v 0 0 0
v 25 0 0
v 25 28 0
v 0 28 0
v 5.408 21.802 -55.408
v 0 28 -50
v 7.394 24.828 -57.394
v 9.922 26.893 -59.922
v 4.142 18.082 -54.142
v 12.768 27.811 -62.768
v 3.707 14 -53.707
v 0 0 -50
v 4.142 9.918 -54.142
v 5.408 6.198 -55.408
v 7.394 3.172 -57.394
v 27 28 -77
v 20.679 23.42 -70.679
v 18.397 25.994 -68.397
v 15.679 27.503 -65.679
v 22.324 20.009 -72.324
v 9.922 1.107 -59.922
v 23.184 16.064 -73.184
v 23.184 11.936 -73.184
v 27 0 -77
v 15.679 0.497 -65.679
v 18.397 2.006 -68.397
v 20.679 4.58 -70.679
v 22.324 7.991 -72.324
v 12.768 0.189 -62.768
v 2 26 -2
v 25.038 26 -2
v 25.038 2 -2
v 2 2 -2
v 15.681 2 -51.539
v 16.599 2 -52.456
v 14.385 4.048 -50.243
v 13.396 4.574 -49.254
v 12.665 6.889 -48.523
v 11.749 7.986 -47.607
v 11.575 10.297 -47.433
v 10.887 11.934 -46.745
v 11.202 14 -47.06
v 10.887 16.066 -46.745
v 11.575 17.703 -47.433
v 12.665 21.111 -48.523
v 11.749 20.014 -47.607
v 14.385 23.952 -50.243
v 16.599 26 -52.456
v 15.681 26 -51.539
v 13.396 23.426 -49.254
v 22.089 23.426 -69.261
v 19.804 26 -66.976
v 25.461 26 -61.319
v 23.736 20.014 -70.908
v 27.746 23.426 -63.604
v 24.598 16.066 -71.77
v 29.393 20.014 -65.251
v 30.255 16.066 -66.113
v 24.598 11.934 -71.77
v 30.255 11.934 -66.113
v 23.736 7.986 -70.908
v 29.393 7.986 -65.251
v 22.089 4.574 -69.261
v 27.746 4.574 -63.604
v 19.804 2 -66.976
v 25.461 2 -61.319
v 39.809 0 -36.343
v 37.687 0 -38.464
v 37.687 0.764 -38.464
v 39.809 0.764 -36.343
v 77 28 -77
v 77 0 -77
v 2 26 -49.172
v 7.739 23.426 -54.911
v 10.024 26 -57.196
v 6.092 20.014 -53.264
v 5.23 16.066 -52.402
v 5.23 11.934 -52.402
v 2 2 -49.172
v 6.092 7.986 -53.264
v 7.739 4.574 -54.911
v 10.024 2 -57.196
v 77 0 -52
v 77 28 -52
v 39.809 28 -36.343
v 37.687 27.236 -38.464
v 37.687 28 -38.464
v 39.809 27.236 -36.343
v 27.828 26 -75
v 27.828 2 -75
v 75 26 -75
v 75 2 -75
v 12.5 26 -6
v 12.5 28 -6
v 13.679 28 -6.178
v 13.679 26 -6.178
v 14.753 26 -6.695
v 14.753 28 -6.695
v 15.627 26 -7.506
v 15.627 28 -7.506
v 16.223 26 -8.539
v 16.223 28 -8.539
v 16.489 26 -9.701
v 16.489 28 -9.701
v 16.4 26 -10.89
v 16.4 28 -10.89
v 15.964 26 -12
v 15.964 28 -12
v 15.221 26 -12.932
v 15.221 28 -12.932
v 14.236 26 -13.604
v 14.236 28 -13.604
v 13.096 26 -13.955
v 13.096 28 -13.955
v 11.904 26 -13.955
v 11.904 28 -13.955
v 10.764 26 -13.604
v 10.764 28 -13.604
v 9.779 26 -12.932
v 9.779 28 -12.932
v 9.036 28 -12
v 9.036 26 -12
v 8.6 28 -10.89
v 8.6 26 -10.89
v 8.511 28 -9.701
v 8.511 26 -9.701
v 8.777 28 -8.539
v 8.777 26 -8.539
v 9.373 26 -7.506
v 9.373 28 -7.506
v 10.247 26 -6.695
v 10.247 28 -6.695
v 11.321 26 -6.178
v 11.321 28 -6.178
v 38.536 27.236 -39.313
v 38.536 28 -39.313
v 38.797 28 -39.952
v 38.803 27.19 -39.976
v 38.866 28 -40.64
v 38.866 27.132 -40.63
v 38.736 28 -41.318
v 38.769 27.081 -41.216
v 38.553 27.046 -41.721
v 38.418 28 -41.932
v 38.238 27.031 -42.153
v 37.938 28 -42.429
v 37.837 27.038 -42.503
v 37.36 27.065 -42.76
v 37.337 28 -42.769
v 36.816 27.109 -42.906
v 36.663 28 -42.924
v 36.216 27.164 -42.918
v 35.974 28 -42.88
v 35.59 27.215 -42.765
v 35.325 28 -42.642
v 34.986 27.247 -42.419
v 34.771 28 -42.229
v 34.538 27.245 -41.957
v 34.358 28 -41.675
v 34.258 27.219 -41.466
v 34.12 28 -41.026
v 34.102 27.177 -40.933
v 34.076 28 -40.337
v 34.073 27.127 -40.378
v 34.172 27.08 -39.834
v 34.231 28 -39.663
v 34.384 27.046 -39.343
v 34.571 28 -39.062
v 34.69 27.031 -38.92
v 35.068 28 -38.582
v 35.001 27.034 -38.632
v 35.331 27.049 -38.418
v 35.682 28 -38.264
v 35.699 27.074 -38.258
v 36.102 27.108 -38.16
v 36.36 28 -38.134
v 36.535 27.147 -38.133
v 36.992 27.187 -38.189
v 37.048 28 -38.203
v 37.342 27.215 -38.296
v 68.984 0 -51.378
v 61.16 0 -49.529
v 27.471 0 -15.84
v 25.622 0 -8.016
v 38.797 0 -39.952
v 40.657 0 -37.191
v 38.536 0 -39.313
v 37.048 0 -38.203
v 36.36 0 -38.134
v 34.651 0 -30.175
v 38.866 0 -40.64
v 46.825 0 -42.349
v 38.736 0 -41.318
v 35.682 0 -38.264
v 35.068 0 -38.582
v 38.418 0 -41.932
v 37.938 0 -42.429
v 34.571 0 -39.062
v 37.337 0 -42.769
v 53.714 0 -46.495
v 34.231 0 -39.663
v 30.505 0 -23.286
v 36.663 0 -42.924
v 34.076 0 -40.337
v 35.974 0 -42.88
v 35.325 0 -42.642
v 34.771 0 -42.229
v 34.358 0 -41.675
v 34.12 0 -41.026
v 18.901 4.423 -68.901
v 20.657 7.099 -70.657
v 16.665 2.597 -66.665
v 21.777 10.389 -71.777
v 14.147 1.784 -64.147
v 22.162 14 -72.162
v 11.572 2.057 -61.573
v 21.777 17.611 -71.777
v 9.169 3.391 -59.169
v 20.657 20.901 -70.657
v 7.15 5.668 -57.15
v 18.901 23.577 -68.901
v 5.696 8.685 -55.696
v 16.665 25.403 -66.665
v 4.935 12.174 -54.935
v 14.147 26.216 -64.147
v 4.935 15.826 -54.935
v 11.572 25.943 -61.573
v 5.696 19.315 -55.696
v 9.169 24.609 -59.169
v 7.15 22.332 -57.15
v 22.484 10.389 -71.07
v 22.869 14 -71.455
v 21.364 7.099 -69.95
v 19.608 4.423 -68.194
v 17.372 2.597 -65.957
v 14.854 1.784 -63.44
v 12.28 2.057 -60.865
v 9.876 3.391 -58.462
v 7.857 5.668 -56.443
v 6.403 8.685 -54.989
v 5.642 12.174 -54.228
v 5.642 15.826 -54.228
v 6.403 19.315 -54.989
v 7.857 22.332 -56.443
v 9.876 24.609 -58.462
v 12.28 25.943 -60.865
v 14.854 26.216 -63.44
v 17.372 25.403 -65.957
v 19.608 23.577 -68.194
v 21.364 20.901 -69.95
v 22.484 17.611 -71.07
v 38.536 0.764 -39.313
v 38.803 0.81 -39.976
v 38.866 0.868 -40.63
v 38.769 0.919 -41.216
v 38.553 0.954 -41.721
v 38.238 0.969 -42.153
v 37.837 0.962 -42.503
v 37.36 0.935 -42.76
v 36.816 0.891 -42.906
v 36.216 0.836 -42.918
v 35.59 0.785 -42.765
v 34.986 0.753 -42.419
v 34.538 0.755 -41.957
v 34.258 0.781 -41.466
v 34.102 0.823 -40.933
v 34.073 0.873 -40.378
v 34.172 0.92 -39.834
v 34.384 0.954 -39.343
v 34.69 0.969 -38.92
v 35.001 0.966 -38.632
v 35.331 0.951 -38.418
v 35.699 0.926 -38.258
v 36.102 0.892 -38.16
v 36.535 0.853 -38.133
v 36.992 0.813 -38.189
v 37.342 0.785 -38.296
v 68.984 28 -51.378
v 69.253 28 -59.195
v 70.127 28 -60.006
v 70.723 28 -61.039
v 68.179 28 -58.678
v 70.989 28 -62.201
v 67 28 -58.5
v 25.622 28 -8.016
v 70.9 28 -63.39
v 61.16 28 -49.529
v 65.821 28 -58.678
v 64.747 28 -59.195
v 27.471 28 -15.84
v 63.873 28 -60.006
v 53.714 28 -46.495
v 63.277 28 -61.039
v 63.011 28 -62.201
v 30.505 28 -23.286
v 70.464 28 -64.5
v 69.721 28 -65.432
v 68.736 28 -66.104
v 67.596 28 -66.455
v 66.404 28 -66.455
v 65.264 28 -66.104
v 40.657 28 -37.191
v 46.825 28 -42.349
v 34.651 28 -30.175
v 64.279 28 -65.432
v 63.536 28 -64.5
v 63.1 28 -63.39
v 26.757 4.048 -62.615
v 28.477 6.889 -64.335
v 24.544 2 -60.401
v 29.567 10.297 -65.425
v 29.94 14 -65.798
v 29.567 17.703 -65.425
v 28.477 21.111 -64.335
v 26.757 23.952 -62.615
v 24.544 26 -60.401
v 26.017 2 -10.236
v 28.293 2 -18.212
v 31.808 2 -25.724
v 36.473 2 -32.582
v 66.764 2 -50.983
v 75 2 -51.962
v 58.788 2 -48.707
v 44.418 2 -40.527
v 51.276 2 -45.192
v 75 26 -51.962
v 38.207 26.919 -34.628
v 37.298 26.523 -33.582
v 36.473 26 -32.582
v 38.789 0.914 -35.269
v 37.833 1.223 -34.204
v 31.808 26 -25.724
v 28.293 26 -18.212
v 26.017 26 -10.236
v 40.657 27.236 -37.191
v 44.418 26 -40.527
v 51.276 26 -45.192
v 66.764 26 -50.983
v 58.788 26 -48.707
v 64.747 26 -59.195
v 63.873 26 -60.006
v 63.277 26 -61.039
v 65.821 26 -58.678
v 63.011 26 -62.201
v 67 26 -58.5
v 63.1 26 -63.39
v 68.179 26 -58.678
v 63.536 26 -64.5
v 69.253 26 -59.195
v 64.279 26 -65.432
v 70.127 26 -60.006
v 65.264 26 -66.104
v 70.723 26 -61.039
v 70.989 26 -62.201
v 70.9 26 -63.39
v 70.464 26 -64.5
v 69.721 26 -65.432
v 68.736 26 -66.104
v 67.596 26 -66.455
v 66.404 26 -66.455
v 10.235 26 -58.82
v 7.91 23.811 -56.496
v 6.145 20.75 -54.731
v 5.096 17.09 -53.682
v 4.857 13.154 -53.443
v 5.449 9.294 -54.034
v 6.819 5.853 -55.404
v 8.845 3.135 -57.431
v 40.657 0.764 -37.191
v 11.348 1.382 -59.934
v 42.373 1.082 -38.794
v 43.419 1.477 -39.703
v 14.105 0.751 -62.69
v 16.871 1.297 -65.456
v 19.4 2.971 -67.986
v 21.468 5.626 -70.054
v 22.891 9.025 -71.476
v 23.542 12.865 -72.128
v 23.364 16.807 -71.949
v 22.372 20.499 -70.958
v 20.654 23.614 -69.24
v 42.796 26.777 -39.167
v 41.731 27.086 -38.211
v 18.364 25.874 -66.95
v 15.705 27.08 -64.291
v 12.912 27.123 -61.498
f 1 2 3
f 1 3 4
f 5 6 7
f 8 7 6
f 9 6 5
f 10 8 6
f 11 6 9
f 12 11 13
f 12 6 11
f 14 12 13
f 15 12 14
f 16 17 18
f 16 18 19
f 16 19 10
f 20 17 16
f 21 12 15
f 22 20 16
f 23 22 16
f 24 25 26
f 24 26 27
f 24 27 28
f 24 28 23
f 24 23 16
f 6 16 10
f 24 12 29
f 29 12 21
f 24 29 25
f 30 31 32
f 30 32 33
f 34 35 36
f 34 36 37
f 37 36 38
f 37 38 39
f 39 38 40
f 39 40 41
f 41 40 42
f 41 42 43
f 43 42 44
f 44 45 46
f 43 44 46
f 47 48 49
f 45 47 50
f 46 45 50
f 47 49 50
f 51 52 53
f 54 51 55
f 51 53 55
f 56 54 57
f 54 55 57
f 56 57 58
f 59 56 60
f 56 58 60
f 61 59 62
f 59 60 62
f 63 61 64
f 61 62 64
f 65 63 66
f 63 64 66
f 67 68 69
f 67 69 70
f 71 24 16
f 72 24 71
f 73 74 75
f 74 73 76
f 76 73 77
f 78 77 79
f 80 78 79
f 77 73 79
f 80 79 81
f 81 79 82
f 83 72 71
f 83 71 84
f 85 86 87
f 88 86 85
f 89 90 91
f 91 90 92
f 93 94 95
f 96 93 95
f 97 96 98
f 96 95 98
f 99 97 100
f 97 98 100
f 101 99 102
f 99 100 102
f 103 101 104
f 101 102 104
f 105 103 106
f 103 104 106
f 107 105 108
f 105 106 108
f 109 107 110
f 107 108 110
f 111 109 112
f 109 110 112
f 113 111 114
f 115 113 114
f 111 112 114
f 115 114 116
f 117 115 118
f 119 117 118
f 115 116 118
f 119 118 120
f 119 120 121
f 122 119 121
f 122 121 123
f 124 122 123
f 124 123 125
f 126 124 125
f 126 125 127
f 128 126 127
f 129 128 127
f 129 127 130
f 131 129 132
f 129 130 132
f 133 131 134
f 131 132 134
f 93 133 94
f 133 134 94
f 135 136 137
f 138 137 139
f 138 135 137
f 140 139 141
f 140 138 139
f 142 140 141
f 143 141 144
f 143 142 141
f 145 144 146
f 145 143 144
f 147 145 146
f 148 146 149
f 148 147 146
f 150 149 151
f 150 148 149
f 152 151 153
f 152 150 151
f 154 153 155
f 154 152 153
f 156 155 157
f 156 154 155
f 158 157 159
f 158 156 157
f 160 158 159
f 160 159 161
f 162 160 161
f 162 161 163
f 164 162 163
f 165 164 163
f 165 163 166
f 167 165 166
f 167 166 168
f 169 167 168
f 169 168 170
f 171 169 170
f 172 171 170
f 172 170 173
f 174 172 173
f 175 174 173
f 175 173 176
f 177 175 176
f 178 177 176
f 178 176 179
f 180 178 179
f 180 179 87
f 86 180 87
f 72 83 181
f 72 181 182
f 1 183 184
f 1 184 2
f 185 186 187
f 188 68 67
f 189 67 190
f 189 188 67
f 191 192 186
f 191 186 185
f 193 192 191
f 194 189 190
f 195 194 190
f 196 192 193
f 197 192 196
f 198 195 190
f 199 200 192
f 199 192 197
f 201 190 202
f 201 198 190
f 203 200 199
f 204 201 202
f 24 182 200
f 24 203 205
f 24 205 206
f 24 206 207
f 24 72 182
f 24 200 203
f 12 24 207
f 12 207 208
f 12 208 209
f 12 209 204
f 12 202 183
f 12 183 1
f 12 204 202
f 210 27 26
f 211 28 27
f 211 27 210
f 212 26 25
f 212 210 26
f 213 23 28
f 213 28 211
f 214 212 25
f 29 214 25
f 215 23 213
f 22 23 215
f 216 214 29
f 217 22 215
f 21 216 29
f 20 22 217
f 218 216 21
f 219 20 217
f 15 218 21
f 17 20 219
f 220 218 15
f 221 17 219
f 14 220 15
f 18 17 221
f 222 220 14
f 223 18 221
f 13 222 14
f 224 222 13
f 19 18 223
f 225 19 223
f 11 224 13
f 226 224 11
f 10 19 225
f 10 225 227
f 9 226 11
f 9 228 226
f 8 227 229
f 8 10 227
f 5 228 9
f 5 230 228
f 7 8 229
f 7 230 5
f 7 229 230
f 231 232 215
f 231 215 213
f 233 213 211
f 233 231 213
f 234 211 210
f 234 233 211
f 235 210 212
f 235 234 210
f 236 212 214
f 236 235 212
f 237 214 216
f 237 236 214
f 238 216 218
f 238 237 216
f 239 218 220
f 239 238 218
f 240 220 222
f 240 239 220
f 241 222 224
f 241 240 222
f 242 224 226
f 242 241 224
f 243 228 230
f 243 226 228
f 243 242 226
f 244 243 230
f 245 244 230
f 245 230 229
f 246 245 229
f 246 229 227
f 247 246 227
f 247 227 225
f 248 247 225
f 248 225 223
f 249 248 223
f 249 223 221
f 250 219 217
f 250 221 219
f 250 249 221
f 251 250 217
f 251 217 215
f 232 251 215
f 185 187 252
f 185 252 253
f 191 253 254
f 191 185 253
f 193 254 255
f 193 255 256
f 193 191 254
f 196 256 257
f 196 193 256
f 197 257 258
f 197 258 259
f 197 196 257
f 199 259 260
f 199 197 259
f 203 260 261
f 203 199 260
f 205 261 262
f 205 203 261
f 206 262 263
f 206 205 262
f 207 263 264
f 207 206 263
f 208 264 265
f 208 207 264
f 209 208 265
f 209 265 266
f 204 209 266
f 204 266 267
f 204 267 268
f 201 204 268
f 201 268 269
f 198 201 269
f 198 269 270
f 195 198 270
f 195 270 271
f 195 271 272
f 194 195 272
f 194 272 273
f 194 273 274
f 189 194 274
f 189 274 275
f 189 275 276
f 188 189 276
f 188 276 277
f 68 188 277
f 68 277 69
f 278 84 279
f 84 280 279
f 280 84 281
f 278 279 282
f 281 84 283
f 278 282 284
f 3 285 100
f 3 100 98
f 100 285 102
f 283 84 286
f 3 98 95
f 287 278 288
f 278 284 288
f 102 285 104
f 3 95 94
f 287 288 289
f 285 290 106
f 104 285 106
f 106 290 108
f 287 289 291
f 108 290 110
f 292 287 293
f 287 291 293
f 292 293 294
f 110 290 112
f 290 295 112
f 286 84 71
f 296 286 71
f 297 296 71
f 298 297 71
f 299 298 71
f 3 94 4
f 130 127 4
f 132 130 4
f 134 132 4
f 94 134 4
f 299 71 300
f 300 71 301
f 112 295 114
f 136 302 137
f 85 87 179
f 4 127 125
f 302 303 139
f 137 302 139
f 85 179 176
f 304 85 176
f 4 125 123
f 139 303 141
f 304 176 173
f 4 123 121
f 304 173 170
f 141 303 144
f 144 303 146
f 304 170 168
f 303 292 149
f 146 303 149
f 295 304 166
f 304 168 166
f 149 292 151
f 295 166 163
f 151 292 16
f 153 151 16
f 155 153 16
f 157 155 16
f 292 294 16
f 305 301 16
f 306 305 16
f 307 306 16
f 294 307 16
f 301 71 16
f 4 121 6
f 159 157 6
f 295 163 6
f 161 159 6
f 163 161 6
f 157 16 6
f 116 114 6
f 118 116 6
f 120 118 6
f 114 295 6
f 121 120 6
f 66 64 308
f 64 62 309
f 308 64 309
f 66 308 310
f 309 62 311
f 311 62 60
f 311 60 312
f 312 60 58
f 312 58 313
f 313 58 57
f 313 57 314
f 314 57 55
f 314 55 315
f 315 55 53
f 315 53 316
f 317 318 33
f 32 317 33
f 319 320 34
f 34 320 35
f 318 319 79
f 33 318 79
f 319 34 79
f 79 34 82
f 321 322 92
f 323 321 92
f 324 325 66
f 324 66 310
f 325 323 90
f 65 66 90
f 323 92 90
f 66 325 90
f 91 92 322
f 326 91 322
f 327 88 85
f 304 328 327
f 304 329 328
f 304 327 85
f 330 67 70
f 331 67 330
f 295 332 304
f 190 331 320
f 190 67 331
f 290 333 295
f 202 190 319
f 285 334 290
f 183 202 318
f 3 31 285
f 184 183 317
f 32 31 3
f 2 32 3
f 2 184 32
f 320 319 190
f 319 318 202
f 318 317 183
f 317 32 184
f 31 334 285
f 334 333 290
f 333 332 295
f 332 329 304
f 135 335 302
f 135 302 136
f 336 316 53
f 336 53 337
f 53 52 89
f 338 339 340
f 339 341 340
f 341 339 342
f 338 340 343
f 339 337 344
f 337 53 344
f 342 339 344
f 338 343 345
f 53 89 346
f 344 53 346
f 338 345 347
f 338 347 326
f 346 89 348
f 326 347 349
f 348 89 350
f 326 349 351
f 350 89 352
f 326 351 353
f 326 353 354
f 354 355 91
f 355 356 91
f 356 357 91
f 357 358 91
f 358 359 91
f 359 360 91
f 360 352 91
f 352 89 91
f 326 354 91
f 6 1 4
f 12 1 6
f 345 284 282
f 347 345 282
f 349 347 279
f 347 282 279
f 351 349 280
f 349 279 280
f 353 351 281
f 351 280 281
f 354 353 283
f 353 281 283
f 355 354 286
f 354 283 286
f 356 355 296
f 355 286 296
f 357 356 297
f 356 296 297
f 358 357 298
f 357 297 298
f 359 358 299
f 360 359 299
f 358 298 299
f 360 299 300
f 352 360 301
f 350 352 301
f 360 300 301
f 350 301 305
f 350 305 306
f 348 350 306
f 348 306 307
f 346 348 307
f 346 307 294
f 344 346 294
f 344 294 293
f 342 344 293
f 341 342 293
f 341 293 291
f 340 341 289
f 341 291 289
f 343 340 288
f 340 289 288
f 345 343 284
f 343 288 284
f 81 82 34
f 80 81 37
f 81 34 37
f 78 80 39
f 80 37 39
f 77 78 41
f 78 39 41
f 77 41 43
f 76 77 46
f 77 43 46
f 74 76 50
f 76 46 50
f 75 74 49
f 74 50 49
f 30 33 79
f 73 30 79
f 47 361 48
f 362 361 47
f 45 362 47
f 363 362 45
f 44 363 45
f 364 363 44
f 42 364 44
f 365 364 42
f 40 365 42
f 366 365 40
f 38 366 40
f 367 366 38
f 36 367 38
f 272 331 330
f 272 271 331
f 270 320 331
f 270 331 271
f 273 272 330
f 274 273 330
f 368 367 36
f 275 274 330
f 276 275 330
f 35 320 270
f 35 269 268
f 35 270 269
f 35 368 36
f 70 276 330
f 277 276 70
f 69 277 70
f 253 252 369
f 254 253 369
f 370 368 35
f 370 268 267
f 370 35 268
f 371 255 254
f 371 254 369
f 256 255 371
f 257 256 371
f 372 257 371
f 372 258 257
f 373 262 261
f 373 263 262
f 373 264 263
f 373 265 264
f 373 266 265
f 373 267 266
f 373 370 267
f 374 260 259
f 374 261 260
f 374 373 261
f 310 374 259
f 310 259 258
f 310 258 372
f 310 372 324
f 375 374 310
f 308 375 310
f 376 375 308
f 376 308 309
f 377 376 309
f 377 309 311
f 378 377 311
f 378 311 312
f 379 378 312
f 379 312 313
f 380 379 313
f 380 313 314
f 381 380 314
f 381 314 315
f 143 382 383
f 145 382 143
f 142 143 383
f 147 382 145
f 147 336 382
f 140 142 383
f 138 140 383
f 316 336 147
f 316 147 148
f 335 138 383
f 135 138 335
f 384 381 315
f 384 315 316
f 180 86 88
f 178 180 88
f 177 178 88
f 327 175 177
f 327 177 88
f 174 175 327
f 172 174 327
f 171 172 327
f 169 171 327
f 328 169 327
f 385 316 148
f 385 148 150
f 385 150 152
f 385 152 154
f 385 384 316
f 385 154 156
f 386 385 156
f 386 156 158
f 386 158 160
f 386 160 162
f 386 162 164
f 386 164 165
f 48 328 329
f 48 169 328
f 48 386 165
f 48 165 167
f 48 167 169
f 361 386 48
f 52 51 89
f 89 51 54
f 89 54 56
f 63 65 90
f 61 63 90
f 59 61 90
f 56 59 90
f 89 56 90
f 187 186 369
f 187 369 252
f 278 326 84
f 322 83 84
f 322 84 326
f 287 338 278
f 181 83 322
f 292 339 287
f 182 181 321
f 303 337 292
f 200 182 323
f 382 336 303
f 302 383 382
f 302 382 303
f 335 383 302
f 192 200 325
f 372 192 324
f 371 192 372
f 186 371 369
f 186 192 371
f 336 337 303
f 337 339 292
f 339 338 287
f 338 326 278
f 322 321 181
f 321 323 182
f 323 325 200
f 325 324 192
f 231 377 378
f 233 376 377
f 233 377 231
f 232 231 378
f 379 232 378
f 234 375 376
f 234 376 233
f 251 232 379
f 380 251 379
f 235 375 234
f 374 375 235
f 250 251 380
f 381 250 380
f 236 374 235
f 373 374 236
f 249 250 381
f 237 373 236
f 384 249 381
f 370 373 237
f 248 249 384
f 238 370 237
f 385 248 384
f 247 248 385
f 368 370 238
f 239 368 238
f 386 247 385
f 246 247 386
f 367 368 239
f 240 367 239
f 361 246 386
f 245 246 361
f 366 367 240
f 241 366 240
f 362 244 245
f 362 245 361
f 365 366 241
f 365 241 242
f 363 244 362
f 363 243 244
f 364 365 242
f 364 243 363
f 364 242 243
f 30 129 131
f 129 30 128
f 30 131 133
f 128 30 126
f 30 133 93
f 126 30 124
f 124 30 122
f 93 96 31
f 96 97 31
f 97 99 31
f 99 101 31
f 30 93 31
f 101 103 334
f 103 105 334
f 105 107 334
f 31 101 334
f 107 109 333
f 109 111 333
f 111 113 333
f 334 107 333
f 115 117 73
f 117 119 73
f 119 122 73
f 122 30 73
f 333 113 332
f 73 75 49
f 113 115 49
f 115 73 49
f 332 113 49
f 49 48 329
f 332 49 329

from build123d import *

# Parameters (mm, degrees)
BOSS_EXTRUDE1_DEPTH      = 28
SHELL1_T                 = -2
CUT_EXTRUDE1_DEPTH       = 12
CUT_EXTRUDE1_DEPTH_BACK  = 12
SKETCH9_R                = 6.4
SKETCH12_R               = 4
CUT_EXTRUDE3_DEPTH       = 2
BOSS_EXTRUDE2_DEPTH      = 0.0001
BOSS_EXTRUDE2_DEPTH_BACK = 10
SKETCH11_R               = 13.85
CUT_EXTRUDE4_DEPTH       = 35
CUT_EXTRUDE4_DEPTH_BACK  = 9
SKETCH13_R               = 13.25
CUT_EXTRUDE5_DEPTH       = 10
CUT_EXTRUDE5_DEPTH_BACK  = 10
SKETCH15_R               = 12.25


with BuildPart() as part:
    # Sketch1 → Boss-Extrude1 (new body)
    with BuildSketch(Plane(origin=(0, 0, 0), x_dir=(1, 0, 0), z_dir=(0, 1, 0))):
        with BuildLine():
            Line((0, 0), (0, 50))
            Line((0, 50), (27, 77))
            Line((27, 77), (77, 77))
            Line((77, 77), (77, 52))
            ThreePointArc((77, 52), (57.377961172, 48.155743087), (40.657159206, 37.191368932))
            Line((40.657159206, 37.191368932), (38.535838862, 39.312689275))
            ThreePointArc((38.535838862, 39.312689275), (34.771350846, 42.228649154), (37.687310725, 38.464161138))
            Line((37.687310725, 38.464161138), (39.808631068, 36.342840794))
            ThreePointArc((39.808631068, 36.342840794), (28.844256913, 19.622038828), (25, 0))
            Line((25, 0), (0, 0))
        make_face()
    extrude(amount=BOSS_EXTRUDE1_DEPTH)

    # Shell1
    shell1_openings = [part.faces().sort_by_distance(p)[0] for p in [
        (57.377961172, 14, -48.155743087),
        (28.844256913, 14, -19.622038828),
    ]]
    offset(amount=SHELL1_T, openings=shell1_openings, kind=Kind.INTERSECTION)

    # Sketch9 → Cut-Extrude1 (cut, two sides: drawn at the far end of the back side and taken through both)
    with BuildSketch(Plane(origin=(0, 14, 0), x_dir=(1, 0, 0), z_dir=(0, 1, 0)).offset(-CUT_EXTRUDE1_DEPTH_BACK)):
        with Locations((36.184678266, 38.815321734)):
            Circle(SKETCH9_R)
    extrude(amount=CUT_EXTRUDE1_DEPTH + CUT_EXTRUDE1_DEPTH_BACK, mode=Mode.SUBTRACT)

    # Sketch12 → Cut-Extrude3 (cut)
    with BuildSketch(Plane(origin=(0, 28, 0), x_dir=(1, 0, 0), z_dir=(0, 1, 0))):
        with Locations((67, 62.5)):
            Circle(SKETCH12_R)
        with Locations((12.5, 10)):
            Circle(SKETCH12_R)
    extrude(amount=-CUT_EXTRUDE3_DEPTH, mode=Mode.SUBTRACT)

    # Sketch11 → Boss-Extrude2 (add, two sides: drawn at the far end of the back side and taken through both)
    with BuildSketch(Plane(origin=(-25, 0, -25), x_dir=(-0.7071067811865435, 0, 0.7071067811865517), z_dir=(-0.7071067811865517, 0, -0.7071067811865435)).offset(-BOSS_EXTRUDE2_DEPTH_BACK)):
        with Locations((-54.447222151, 14)):
            Circle(SKETCH11_R)
    extrude(amount=BOSS_EXTRUDE2_DEPTH + BOSS_EXTRUDE2_DEPTH_BACK)

    # Sketch13 → Cut-Extrude4 (cut, two sides: drawn at the far end of the back side and taken through both)
    with BuildSketch(Plane(origin=(-17.928932188, 0, -17.928932188), x_dir=(0.7071067811865435, 0, -0.7071067811865516), z_dir=(0.7071067811865516, 0, 0.7071067811865435)).offset(-CUT_EXTRUDE4_DEPTH_BACK)):
        with Locations((54.447222151, 14)):
            Circle(SKETCH13_R)
    extrude(amount=CUT_EXTRUDE4_DEPTH + CUT_EXTRUDE4_DEPTH_BACK, mode=Mode.SUBTRACT)

    # Sketch15 → Cut-Extrude5 (cut, two sides: drawn at the far end of the back side and taken through both)
    with BuildSketch(Plane(origin=(-25, 0, -25), x_dir=(-0.7071067811865435, 0, 0.7071067811865517), z_dir=(-0.7071067811865517, 0, -0.7071067811865435)).offset(-CUT_EXTRUDE5_DEPTH_BACK)):
        with Locations((-54.447222151, 14)):
            Circle(SKETCH15_R)
    extrude(amount=CUT_EXTRUDE5_DEPTH + CUT_EXTRUDE5_DEPTH_BACK, mode=Mode.SUBTRACT)


solid = part.part
